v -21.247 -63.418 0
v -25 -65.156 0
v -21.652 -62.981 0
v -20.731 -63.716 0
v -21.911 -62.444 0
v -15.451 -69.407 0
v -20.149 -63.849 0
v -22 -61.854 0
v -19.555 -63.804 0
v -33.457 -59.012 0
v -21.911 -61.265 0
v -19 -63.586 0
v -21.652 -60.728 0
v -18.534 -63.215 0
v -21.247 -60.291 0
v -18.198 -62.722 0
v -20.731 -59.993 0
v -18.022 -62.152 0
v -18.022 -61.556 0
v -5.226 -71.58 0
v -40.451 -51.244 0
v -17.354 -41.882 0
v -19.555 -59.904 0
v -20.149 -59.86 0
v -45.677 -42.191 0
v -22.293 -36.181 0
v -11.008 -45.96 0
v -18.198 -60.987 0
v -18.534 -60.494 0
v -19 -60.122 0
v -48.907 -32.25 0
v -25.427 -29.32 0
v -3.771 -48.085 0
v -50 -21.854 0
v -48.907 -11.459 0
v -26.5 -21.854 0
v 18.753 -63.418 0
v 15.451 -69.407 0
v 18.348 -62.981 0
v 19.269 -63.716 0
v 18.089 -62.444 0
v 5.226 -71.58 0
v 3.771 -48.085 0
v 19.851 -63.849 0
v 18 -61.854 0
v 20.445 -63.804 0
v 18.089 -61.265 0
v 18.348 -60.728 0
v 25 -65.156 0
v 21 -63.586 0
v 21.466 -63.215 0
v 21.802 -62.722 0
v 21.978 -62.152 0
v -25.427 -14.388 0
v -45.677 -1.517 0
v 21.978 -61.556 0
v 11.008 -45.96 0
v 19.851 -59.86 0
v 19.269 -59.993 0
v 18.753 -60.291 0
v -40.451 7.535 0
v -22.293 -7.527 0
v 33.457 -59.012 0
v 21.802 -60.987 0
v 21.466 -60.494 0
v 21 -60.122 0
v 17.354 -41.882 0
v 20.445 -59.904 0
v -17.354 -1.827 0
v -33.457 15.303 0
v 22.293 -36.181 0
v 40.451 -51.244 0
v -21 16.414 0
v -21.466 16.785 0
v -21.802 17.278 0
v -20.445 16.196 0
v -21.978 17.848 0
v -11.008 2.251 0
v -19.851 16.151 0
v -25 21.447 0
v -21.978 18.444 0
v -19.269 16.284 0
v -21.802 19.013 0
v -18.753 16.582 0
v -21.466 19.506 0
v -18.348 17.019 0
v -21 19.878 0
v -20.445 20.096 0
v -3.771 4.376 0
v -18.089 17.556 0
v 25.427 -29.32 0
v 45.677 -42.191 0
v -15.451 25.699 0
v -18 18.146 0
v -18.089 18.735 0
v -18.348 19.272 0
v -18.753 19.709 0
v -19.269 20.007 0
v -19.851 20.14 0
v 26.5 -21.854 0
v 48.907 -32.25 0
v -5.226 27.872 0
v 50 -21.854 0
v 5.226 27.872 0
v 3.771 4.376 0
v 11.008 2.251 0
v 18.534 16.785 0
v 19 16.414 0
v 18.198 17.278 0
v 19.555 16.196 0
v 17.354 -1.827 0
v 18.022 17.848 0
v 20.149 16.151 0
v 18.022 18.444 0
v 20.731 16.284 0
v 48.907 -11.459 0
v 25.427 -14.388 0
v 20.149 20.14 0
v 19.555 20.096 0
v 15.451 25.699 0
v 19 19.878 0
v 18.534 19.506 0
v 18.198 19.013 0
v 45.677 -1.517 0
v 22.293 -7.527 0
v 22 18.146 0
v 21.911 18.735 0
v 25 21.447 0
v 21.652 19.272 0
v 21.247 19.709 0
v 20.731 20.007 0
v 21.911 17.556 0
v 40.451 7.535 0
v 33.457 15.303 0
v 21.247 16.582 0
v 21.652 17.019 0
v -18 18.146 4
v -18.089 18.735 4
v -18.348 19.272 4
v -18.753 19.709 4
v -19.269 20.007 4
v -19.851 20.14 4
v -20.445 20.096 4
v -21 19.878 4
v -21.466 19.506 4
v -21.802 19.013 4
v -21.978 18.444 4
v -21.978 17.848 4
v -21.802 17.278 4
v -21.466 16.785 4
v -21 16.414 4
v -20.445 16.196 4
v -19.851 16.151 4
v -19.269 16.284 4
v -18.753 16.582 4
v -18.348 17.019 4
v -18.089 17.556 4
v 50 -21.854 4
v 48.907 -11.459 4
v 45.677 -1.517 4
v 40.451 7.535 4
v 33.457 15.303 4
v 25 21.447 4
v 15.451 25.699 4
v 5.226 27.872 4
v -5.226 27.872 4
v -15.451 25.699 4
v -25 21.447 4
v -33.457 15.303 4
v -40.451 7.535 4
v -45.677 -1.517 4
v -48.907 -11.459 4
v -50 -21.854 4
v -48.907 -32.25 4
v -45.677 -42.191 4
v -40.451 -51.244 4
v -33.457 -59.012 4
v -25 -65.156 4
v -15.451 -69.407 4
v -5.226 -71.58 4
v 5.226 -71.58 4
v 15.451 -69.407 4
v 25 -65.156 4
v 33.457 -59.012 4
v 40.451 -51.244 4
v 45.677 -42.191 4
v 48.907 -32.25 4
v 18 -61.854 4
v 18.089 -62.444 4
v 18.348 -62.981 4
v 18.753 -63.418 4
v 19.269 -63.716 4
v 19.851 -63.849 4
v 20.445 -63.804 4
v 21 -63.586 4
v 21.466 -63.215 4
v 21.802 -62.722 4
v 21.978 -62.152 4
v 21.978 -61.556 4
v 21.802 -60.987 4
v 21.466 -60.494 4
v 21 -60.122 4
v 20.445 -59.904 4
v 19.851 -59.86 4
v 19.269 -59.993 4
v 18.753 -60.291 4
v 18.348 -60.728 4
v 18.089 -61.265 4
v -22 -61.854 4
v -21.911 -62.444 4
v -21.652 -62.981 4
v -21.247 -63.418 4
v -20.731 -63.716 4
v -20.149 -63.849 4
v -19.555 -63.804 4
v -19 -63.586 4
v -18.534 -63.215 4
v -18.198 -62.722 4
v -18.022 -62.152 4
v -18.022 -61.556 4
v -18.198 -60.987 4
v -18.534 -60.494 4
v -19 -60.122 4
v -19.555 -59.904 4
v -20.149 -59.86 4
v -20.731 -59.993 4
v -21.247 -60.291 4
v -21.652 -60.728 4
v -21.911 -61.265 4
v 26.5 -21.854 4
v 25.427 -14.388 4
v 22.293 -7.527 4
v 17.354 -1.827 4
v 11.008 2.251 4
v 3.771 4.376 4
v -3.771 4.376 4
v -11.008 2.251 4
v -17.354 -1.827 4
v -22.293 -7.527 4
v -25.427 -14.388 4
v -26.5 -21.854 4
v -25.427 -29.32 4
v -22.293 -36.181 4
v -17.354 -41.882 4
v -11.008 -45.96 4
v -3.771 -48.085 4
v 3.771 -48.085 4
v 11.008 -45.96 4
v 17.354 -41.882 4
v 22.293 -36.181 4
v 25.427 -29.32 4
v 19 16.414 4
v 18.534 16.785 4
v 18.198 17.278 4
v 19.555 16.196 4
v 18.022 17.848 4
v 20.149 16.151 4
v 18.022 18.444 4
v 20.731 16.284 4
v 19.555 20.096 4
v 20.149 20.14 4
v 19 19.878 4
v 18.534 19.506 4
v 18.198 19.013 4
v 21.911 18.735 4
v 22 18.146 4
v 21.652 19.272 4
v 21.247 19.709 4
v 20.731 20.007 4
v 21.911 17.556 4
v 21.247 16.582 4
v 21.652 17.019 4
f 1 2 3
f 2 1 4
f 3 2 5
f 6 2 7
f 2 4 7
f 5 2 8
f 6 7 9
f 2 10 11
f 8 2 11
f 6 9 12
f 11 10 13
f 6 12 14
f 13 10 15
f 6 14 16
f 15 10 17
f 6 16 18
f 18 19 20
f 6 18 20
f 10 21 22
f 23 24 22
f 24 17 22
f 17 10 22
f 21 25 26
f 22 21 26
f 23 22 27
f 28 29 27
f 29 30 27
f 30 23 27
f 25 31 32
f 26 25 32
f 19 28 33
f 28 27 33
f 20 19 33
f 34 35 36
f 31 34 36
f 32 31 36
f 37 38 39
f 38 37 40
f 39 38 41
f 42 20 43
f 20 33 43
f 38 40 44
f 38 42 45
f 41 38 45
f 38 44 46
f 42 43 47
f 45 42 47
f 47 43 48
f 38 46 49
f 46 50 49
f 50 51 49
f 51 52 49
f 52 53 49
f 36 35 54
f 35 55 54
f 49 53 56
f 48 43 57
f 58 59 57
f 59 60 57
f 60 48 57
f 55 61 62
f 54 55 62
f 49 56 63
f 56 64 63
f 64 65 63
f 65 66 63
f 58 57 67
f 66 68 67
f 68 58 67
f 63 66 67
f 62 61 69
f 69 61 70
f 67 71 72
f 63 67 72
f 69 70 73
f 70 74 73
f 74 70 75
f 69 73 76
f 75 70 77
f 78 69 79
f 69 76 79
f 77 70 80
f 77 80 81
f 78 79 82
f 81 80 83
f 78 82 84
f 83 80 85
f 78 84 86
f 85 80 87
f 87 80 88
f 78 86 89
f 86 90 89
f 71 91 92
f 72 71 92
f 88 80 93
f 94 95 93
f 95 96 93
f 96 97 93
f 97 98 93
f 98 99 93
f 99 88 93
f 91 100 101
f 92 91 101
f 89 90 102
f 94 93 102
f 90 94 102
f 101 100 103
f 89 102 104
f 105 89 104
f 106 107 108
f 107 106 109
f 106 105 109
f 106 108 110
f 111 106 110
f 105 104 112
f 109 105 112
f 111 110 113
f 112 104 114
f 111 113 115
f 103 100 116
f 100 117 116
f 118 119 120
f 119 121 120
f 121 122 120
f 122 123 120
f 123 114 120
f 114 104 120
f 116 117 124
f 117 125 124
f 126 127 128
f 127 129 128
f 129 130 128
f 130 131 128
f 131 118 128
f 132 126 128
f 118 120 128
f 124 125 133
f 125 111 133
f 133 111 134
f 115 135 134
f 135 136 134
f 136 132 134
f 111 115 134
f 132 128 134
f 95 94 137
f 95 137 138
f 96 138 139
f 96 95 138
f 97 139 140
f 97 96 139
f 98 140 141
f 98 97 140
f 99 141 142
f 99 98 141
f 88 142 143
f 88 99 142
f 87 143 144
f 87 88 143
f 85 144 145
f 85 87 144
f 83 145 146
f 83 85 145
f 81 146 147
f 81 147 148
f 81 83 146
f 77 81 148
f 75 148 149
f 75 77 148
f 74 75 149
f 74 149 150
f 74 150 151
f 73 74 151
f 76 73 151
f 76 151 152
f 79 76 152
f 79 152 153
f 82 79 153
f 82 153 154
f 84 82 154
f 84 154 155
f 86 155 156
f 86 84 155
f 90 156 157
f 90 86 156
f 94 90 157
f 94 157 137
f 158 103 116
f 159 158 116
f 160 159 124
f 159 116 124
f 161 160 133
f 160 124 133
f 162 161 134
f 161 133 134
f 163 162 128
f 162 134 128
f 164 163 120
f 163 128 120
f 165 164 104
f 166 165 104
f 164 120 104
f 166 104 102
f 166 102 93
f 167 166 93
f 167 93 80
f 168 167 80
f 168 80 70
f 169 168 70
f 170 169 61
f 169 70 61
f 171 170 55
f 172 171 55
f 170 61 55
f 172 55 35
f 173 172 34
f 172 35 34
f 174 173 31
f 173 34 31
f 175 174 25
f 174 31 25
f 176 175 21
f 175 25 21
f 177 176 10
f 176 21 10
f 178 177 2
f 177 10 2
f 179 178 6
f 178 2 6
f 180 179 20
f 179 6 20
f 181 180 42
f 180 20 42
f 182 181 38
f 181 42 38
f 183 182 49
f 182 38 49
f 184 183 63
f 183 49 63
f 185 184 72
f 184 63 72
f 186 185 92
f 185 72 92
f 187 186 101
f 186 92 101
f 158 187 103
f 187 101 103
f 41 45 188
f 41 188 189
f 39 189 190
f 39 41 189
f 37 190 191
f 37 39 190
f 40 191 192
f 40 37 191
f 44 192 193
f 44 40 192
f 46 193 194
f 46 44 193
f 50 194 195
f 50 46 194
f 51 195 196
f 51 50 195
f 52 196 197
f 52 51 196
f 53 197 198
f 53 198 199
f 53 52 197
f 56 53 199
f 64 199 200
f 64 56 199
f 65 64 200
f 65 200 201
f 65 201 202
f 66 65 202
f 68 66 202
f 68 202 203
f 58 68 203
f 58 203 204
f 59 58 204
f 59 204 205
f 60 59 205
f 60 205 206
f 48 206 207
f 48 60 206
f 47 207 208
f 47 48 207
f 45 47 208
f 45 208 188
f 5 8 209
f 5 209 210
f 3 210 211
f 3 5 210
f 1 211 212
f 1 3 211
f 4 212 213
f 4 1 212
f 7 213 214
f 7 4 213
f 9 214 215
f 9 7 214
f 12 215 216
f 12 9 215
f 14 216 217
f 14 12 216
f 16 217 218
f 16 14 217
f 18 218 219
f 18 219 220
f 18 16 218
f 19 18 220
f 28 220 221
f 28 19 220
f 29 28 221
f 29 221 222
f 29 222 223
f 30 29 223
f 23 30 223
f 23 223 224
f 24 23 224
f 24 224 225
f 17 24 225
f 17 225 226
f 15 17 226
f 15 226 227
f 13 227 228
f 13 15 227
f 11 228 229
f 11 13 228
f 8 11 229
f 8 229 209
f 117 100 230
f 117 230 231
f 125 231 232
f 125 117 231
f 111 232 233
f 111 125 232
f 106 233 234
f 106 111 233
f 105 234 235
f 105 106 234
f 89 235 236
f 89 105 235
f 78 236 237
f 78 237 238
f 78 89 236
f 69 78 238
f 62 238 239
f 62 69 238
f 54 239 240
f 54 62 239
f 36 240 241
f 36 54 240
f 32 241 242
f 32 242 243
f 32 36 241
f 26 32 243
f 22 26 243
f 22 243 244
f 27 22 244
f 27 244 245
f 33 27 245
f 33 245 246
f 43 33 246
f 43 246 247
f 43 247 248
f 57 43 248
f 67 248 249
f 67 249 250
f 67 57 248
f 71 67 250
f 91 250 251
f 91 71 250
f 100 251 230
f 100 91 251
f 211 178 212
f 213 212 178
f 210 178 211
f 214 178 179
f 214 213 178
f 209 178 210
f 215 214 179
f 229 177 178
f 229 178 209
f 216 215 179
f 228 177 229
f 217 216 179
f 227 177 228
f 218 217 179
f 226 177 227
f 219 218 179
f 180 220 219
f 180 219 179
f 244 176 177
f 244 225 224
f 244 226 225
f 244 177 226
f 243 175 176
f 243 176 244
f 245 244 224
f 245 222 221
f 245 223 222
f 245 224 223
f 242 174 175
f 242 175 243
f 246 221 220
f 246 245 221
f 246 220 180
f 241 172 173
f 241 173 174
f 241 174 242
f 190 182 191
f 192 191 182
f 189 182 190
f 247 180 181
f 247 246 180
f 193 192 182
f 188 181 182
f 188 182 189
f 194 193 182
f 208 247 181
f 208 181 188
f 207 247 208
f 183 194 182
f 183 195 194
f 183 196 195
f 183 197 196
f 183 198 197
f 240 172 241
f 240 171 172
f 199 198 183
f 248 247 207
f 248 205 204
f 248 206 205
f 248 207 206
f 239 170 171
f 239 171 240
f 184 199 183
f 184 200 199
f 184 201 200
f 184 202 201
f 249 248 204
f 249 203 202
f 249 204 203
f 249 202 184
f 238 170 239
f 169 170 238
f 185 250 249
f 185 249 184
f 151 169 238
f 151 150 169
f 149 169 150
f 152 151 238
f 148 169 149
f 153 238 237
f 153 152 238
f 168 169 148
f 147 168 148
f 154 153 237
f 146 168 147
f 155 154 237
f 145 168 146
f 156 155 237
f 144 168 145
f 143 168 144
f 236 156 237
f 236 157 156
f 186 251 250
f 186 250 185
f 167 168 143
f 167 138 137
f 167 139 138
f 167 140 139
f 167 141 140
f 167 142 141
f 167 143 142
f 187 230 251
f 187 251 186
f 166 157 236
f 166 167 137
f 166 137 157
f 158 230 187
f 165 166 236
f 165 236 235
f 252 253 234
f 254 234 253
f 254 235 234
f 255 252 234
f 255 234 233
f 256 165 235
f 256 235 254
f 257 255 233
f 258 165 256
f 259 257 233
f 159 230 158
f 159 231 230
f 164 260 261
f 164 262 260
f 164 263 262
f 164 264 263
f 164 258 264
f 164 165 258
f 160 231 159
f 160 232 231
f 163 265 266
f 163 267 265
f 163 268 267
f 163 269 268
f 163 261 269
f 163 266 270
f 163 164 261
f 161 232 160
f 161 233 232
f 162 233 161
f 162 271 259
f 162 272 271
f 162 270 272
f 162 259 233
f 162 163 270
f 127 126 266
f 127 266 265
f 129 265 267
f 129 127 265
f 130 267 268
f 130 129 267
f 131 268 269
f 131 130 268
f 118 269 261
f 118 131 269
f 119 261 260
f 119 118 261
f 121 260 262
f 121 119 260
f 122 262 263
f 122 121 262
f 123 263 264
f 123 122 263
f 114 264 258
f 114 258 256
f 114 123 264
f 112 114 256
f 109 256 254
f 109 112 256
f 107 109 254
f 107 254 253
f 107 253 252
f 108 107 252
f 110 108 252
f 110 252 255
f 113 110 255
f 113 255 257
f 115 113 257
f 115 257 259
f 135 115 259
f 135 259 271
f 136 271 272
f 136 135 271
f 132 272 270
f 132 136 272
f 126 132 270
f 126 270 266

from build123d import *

# Parameters (mm, degrees)
SKETCH_1_R      = 50
SKETCH_1_R_2    = 2
SKETCH_1_R_3    = 26.5
EXTRUDE_1_DEPTH = 4


with BuildPart() as part:
    # 草图1 → 凸台-拉伸1 (new body)
    with BuildSketch(Plane.XY):
        with Locations((0, -21.854285714)):
            Circle(SKETCH_1_R)
        with Locations((-20, 18.145714286)):
            Circle(SKETCH_1_R_2, mode=Mode.SUBTRACT)
        with Locations((20, 18.145714286)):
            Circle(SKETCH_1_R_2, mode=Mode.SUBTRACT)
        with Locations(Location((20, -61.854285714, 0), (0, 0, 180))):
            Circle(SKETCH_1_R_2, mode=Mode.SUBTRACT)
        with Locations(Location((-20, -61.854285714, 0), (0, 0, 180))):
            Circle(SKETCH_1_R_2, mode=Mode.SUBTRACT)
        with Locations((0, -21.854285714)):
            Circle(SKETCH_1_R_3, mode=Mode.SUBTRACT)
    extrude(amount=EXTRUDE_1_DEPTH)


solid = part.part
